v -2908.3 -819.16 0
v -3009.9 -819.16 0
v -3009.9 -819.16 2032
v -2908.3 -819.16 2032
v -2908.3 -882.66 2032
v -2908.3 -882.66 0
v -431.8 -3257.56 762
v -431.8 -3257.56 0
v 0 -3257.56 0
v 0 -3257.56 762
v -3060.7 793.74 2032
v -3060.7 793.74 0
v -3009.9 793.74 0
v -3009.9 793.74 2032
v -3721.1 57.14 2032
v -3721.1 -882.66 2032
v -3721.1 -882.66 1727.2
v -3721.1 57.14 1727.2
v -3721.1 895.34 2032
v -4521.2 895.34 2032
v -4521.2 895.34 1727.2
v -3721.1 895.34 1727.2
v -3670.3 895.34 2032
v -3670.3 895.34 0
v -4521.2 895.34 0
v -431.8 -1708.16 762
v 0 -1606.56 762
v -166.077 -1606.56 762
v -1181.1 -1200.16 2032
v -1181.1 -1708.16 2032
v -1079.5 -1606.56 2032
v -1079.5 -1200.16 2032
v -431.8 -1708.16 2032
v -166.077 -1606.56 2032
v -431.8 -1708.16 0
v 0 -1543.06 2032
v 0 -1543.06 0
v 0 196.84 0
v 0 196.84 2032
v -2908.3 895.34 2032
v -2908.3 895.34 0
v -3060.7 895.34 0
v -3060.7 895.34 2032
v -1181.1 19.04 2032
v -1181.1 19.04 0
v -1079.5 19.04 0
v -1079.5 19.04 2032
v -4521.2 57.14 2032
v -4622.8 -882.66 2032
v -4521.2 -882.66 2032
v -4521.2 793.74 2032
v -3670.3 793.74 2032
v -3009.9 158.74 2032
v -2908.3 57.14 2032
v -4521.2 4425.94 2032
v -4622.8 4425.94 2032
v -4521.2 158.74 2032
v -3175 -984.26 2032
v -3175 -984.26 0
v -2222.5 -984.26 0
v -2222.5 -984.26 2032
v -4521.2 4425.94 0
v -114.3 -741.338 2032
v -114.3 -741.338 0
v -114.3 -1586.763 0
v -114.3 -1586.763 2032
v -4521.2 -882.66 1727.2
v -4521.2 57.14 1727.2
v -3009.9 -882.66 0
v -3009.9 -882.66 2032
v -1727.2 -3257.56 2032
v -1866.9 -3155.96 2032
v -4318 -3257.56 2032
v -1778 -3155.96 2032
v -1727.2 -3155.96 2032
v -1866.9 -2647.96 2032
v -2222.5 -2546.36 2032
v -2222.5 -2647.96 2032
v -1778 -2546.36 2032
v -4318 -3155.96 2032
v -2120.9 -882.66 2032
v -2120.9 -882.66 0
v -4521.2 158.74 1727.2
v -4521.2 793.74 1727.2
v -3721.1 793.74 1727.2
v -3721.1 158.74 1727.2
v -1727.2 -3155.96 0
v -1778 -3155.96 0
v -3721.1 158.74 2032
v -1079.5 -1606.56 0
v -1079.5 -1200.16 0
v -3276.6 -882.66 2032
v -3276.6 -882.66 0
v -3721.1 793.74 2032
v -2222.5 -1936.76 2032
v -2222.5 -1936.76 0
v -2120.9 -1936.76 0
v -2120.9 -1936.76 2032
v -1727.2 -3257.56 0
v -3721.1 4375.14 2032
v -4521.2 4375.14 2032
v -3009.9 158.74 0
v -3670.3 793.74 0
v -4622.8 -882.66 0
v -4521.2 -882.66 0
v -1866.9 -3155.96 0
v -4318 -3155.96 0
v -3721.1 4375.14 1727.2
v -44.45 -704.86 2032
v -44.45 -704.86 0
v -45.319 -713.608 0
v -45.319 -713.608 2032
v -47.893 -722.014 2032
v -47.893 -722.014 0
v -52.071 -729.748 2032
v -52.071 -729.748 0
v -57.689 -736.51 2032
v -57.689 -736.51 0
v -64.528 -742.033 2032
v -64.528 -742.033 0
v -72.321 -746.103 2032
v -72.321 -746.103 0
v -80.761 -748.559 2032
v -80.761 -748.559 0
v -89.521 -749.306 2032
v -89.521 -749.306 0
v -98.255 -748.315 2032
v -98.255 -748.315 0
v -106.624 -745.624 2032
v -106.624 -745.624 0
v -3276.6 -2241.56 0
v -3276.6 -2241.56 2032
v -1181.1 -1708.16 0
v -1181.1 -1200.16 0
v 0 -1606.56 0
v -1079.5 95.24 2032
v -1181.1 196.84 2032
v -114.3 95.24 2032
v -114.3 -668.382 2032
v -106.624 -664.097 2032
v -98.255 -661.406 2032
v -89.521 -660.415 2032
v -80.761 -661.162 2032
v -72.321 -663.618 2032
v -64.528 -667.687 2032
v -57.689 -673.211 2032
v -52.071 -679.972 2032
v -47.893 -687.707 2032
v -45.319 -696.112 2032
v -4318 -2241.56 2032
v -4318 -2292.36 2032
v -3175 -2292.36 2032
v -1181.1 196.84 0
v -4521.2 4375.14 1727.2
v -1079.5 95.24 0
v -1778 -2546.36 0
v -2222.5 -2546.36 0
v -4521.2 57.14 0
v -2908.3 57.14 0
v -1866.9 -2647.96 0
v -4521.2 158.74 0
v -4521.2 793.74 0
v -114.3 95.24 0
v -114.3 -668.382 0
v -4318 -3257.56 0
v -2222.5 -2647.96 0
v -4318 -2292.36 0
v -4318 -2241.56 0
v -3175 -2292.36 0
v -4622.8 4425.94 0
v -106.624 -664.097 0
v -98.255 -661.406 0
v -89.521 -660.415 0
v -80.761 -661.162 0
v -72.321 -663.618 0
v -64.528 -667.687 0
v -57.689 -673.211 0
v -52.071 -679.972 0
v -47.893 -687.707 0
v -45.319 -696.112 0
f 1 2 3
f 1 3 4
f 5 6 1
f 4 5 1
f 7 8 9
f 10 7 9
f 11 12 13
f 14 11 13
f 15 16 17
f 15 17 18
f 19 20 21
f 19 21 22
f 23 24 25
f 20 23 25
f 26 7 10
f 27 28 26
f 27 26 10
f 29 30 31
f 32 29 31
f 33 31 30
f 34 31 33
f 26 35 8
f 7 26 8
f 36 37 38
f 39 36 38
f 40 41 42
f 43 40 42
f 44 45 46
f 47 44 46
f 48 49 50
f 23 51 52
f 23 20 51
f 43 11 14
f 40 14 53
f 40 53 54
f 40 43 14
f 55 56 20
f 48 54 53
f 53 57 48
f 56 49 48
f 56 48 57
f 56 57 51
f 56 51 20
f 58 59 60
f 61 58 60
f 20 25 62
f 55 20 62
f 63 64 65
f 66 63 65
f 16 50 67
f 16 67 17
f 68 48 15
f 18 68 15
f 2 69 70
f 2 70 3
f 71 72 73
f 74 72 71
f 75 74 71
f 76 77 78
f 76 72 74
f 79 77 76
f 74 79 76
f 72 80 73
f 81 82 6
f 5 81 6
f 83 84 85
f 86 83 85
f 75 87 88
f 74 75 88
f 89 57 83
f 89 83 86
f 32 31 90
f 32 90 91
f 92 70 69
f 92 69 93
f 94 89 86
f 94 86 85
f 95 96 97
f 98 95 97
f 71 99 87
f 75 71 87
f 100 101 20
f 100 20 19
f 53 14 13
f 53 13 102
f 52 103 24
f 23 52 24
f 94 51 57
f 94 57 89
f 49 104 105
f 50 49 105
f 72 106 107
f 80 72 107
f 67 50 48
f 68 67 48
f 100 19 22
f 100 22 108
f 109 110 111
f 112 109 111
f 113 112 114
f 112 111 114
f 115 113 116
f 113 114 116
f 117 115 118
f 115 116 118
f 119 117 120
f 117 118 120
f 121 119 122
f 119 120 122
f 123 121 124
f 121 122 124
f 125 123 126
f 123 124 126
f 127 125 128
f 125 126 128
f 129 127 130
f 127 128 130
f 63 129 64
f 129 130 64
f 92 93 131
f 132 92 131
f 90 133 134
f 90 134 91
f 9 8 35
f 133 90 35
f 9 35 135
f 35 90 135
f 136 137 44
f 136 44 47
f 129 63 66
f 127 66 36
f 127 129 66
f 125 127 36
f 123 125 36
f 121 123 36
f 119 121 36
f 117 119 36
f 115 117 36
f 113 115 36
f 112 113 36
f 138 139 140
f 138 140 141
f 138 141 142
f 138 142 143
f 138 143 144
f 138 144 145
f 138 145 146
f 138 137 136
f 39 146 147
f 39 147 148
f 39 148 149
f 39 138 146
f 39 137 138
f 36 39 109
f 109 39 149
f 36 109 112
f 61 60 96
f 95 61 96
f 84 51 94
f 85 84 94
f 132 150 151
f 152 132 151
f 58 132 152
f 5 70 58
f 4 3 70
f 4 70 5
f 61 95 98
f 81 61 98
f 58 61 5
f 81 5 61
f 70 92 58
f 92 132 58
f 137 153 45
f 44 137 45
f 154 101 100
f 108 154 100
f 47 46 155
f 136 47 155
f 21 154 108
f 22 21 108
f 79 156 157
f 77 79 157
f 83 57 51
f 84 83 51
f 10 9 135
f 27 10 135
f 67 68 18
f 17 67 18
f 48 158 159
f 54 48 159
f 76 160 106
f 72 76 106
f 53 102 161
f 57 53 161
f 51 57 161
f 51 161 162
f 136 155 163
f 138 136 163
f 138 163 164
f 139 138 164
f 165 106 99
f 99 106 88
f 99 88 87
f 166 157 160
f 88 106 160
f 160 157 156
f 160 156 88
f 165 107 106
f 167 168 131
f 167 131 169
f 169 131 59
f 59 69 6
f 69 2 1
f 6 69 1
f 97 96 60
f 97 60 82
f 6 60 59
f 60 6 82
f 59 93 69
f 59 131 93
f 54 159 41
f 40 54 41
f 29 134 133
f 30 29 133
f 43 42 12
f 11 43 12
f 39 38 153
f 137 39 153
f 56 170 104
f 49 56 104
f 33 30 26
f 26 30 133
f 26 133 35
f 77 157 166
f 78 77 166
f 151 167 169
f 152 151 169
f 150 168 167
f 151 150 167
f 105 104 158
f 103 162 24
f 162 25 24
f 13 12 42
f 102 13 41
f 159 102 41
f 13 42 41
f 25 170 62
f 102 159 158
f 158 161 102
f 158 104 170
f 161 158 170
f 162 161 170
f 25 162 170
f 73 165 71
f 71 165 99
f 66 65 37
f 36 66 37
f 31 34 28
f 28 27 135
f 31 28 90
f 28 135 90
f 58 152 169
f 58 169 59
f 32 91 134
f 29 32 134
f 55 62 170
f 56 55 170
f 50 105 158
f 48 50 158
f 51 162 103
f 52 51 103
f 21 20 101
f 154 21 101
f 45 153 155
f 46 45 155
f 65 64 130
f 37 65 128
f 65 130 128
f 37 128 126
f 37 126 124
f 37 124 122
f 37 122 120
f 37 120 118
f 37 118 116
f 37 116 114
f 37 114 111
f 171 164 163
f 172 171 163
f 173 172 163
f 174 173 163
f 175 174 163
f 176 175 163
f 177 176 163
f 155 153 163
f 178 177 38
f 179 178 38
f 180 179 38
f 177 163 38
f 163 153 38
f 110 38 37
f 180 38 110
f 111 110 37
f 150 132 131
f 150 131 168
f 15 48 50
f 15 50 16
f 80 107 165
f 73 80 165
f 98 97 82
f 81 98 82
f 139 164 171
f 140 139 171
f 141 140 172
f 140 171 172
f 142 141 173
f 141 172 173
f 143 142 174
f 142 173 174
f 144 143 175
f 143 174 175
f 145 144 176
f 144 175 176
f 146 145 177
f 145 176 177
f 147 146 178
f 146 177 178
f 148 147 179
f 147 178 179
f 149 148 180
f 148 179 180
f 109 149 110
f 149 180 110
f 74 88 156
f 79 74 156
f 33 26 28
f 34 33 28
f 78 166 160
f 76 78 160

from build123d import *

# Parameters (mm, degrees)
F1_DEPTH = 2032
F0_W     = 101.6
F0_H     = 63.5
F2_W     = 800.1
F2_H     = 3479.8
F3_DEPTH = 304.8
F2_H_2   = 635
F2_H_3   = 939.8
F4_DEPTH = 762


with BuildPart() as f1:
    # F0 (on Top) → F1 (new body)
    with BuildSketch(Plane.XY):
        with BuildLine():
            Line((0, 196.8397610903), (-1181.1, 196.8397610903))
            Line((-1181.1, 196.8397610903), (-1181.1, 95.2397610903))
            Line((-1181.1, 95.2397610903), (-1181.1, 19.0397610903))
            Line((-1181.1, 19.0397610903), (-1079.5, 19.0397610903))
            Line((-1079.5, 19.0397610903), (-1079.5, 95.2397610903))
            Line((-1079.5, 95.2397610903), (-114.3, 95.2397610903))
            Line((-114.3, 95.2397610903), (-114.3, -631.3678622246))
            Line((-114.3, -631.3678622246), (-114.3, -668.3822661042))
            ThreePointArc((-114.3, -668.3822661042), (-68.3236482826, -665.4595250837), (-44.45, -704.8602389097))
            ThreePointArc((-44.45, -704.8602389097), (-68.3236482826, -744.2609527357), (-114.3, -741.3382117152))
            Line((-114.3, -741.3382117152), (-114.3, -1586.7631800862))
            Line((-114.3, -1586.7631800862), (0, -1543.0602389097))
            Line((0, -1543.0602389097), (0, 95.2397610903))
            Line((0, 95.2397610903), (0, 196.8397610903))
        make_face()
    extrude(amount=F1_DEPTH)


with BuildPart() as f1b:
    # F0 (on Top) → F1, piece 2 (new body)
    with BuildSketch(Plane.XY):
        Polygon((-431.8, -1708.1602389097), (-166.0769230769, -1606.5602389097), (-1079.5, -1606.5602389097), (-1079.5, -1403.3602389097), (-1079.5, -1200.1602389097), (-1181.1, -1200.1602389097), (-1181.1, -1403.3602389097), (-1181.1, -1708.1602389097), align=None)
    extrude(amount=F1_DEPTH)

    # F0 (on Top) → F4 (join)
    with BuildSketch(Plane.XY):
        Polygon((0, -1695.4602389097), (0, -1606.5602389097), (-114.3, -1606.5602389097), (-166.0769230769, -1606.5602389097), (-431.8, -1708.1602389097), (-431.8, -3257.5602389097), (0, -3257.5602389097), align=None)
    extrude(amount=F4_DEPTH)


with BuildPart() as f1c:
    # F0 (on Top) → F1, piece 3 (new body)
    with BuildSketch(Plane.XY):
        Polygon((-4318, -2241.5602389097), (-4318, -2292.3602389097), (-4127.5, -2292.3602389097), (-3175, -2292.3602389097), (-3175, -2241.5602389097), (-3175, -984.2602389097), (-2222.5, -984.2602389097), (-2222.5, -1936.7602389097), (-2120.9, -1936.7602389097), (-2120.9, -882.6602389097), (-2908.3, -882.6602389097), (-3009.9, -882.6602389097), (-3276.6, -882.6602389097), (-3276.6, -2241.5602389097), (-4127.5, -2241.5602389097), align=None)
        with Locations((-2959.1, -850.9102389097)):
            Rectangle(F0_W, F0_H)
    extrude(amount=F1_DEPTH)


with BuildPart() as f1d:
    # F0 (on Top) → F1, piece 4 (new body)
    with BuildSketch(Plane.XY):
        Polygon((-4127.5, -3257.5602389097), (-1727.2, -3257.5602389097), (-1727.2, -3192.6818602324), (-1727.2, -3155.9602389097), (-1778, -3155.9602389097), (-1778, -2546.3602389097), (-1866.9, -2546.3602389097), (-2038.0726083756, -2546.3602389097), (-2120.9, -2546.3602389097), (-2222.5, -2546.3602389097), (-2222.5, -2647.9602389097), (-2038.0726083756, -2647.9602389097), (-1866.9, -2647.9602389097), (-1866.9, -3155.9602389097), (-4127.5, -3155.9602389097), (-4318, -3155.9602389097), (-4318, -3257.5602389097), align=None)
    extrude(amount=F1_DEPTH)


with BuildPart() as f1e:
    # F0 (on Top) → F1, piece 5 (new body)
    with BuildSketch(Plane.XY):
        Polygon((-4622.8, 578.4776806831), (-4622.8, -882.6602389097), (-4521.2, -882.6602389097), (-4521.2, 57.1397610903), (-3276.6, 57.1397610903), (-3009.9, 57.1397610903), (-2908.3, 57.1397610903), (-2908.3, 158.7397610903), (-2908.3, 895.3397610903), (-3009.9, 895.3397610903), (-3060.7, 895.3397610903), (-3060.7, 793.7397610903), (-3009.9, 793.7397610903), (-3009.9, 158.7397610903), (-3111.5, 158.7397610903), (-4521.2, 158.7397610903), (-4521.2, 793.7397610903), (-3670.3, 793.7397610903), (-3670.3, 895.3397610903), (-4521.2, 895.3397610903), (-4521.2, 4425.9397610903), (-4622.8, 4425.9397610903), align=None)
    extrude(amount=F1_DEPTH)


with BuildPart() as f3:
    # F2 (on face) → F3 (new body)
    with BuildSketch(Plane.XY.offset(2032)):
        with Locations((-4121.15, 2635.2397610903)):
            Rectangle(F2_W, F2_H)
    extrude(amount=-F3_DEPTH)


with BuildPart() as f3b:
    # F2 (on face) → F3, piece 2 (new body)
    with BuildSketch(Plane.XY.offset(2032)):
        with Locations((-4121.15, 476.2397610903)):
            Rectangle(F2_W, F2_H_2)
    extrude(amount=-F3_DEPTH)


with BuildPart() as f3c:
    # F2 (on face) → F3, piece 3 (new body)
    with BuildSketch(Plane.XY.offset(2032)):
        with Locations((-4121.15, -412.7602389097)):
            Rectangle(F2_W, F2_H_3)
    extrude(amount=-F3_DEPTH)


solid = Compound([f1.part, f1b.part, f1c.part, f1d.part, f1e.part, f3.part, f3b.part, f3c.part])
